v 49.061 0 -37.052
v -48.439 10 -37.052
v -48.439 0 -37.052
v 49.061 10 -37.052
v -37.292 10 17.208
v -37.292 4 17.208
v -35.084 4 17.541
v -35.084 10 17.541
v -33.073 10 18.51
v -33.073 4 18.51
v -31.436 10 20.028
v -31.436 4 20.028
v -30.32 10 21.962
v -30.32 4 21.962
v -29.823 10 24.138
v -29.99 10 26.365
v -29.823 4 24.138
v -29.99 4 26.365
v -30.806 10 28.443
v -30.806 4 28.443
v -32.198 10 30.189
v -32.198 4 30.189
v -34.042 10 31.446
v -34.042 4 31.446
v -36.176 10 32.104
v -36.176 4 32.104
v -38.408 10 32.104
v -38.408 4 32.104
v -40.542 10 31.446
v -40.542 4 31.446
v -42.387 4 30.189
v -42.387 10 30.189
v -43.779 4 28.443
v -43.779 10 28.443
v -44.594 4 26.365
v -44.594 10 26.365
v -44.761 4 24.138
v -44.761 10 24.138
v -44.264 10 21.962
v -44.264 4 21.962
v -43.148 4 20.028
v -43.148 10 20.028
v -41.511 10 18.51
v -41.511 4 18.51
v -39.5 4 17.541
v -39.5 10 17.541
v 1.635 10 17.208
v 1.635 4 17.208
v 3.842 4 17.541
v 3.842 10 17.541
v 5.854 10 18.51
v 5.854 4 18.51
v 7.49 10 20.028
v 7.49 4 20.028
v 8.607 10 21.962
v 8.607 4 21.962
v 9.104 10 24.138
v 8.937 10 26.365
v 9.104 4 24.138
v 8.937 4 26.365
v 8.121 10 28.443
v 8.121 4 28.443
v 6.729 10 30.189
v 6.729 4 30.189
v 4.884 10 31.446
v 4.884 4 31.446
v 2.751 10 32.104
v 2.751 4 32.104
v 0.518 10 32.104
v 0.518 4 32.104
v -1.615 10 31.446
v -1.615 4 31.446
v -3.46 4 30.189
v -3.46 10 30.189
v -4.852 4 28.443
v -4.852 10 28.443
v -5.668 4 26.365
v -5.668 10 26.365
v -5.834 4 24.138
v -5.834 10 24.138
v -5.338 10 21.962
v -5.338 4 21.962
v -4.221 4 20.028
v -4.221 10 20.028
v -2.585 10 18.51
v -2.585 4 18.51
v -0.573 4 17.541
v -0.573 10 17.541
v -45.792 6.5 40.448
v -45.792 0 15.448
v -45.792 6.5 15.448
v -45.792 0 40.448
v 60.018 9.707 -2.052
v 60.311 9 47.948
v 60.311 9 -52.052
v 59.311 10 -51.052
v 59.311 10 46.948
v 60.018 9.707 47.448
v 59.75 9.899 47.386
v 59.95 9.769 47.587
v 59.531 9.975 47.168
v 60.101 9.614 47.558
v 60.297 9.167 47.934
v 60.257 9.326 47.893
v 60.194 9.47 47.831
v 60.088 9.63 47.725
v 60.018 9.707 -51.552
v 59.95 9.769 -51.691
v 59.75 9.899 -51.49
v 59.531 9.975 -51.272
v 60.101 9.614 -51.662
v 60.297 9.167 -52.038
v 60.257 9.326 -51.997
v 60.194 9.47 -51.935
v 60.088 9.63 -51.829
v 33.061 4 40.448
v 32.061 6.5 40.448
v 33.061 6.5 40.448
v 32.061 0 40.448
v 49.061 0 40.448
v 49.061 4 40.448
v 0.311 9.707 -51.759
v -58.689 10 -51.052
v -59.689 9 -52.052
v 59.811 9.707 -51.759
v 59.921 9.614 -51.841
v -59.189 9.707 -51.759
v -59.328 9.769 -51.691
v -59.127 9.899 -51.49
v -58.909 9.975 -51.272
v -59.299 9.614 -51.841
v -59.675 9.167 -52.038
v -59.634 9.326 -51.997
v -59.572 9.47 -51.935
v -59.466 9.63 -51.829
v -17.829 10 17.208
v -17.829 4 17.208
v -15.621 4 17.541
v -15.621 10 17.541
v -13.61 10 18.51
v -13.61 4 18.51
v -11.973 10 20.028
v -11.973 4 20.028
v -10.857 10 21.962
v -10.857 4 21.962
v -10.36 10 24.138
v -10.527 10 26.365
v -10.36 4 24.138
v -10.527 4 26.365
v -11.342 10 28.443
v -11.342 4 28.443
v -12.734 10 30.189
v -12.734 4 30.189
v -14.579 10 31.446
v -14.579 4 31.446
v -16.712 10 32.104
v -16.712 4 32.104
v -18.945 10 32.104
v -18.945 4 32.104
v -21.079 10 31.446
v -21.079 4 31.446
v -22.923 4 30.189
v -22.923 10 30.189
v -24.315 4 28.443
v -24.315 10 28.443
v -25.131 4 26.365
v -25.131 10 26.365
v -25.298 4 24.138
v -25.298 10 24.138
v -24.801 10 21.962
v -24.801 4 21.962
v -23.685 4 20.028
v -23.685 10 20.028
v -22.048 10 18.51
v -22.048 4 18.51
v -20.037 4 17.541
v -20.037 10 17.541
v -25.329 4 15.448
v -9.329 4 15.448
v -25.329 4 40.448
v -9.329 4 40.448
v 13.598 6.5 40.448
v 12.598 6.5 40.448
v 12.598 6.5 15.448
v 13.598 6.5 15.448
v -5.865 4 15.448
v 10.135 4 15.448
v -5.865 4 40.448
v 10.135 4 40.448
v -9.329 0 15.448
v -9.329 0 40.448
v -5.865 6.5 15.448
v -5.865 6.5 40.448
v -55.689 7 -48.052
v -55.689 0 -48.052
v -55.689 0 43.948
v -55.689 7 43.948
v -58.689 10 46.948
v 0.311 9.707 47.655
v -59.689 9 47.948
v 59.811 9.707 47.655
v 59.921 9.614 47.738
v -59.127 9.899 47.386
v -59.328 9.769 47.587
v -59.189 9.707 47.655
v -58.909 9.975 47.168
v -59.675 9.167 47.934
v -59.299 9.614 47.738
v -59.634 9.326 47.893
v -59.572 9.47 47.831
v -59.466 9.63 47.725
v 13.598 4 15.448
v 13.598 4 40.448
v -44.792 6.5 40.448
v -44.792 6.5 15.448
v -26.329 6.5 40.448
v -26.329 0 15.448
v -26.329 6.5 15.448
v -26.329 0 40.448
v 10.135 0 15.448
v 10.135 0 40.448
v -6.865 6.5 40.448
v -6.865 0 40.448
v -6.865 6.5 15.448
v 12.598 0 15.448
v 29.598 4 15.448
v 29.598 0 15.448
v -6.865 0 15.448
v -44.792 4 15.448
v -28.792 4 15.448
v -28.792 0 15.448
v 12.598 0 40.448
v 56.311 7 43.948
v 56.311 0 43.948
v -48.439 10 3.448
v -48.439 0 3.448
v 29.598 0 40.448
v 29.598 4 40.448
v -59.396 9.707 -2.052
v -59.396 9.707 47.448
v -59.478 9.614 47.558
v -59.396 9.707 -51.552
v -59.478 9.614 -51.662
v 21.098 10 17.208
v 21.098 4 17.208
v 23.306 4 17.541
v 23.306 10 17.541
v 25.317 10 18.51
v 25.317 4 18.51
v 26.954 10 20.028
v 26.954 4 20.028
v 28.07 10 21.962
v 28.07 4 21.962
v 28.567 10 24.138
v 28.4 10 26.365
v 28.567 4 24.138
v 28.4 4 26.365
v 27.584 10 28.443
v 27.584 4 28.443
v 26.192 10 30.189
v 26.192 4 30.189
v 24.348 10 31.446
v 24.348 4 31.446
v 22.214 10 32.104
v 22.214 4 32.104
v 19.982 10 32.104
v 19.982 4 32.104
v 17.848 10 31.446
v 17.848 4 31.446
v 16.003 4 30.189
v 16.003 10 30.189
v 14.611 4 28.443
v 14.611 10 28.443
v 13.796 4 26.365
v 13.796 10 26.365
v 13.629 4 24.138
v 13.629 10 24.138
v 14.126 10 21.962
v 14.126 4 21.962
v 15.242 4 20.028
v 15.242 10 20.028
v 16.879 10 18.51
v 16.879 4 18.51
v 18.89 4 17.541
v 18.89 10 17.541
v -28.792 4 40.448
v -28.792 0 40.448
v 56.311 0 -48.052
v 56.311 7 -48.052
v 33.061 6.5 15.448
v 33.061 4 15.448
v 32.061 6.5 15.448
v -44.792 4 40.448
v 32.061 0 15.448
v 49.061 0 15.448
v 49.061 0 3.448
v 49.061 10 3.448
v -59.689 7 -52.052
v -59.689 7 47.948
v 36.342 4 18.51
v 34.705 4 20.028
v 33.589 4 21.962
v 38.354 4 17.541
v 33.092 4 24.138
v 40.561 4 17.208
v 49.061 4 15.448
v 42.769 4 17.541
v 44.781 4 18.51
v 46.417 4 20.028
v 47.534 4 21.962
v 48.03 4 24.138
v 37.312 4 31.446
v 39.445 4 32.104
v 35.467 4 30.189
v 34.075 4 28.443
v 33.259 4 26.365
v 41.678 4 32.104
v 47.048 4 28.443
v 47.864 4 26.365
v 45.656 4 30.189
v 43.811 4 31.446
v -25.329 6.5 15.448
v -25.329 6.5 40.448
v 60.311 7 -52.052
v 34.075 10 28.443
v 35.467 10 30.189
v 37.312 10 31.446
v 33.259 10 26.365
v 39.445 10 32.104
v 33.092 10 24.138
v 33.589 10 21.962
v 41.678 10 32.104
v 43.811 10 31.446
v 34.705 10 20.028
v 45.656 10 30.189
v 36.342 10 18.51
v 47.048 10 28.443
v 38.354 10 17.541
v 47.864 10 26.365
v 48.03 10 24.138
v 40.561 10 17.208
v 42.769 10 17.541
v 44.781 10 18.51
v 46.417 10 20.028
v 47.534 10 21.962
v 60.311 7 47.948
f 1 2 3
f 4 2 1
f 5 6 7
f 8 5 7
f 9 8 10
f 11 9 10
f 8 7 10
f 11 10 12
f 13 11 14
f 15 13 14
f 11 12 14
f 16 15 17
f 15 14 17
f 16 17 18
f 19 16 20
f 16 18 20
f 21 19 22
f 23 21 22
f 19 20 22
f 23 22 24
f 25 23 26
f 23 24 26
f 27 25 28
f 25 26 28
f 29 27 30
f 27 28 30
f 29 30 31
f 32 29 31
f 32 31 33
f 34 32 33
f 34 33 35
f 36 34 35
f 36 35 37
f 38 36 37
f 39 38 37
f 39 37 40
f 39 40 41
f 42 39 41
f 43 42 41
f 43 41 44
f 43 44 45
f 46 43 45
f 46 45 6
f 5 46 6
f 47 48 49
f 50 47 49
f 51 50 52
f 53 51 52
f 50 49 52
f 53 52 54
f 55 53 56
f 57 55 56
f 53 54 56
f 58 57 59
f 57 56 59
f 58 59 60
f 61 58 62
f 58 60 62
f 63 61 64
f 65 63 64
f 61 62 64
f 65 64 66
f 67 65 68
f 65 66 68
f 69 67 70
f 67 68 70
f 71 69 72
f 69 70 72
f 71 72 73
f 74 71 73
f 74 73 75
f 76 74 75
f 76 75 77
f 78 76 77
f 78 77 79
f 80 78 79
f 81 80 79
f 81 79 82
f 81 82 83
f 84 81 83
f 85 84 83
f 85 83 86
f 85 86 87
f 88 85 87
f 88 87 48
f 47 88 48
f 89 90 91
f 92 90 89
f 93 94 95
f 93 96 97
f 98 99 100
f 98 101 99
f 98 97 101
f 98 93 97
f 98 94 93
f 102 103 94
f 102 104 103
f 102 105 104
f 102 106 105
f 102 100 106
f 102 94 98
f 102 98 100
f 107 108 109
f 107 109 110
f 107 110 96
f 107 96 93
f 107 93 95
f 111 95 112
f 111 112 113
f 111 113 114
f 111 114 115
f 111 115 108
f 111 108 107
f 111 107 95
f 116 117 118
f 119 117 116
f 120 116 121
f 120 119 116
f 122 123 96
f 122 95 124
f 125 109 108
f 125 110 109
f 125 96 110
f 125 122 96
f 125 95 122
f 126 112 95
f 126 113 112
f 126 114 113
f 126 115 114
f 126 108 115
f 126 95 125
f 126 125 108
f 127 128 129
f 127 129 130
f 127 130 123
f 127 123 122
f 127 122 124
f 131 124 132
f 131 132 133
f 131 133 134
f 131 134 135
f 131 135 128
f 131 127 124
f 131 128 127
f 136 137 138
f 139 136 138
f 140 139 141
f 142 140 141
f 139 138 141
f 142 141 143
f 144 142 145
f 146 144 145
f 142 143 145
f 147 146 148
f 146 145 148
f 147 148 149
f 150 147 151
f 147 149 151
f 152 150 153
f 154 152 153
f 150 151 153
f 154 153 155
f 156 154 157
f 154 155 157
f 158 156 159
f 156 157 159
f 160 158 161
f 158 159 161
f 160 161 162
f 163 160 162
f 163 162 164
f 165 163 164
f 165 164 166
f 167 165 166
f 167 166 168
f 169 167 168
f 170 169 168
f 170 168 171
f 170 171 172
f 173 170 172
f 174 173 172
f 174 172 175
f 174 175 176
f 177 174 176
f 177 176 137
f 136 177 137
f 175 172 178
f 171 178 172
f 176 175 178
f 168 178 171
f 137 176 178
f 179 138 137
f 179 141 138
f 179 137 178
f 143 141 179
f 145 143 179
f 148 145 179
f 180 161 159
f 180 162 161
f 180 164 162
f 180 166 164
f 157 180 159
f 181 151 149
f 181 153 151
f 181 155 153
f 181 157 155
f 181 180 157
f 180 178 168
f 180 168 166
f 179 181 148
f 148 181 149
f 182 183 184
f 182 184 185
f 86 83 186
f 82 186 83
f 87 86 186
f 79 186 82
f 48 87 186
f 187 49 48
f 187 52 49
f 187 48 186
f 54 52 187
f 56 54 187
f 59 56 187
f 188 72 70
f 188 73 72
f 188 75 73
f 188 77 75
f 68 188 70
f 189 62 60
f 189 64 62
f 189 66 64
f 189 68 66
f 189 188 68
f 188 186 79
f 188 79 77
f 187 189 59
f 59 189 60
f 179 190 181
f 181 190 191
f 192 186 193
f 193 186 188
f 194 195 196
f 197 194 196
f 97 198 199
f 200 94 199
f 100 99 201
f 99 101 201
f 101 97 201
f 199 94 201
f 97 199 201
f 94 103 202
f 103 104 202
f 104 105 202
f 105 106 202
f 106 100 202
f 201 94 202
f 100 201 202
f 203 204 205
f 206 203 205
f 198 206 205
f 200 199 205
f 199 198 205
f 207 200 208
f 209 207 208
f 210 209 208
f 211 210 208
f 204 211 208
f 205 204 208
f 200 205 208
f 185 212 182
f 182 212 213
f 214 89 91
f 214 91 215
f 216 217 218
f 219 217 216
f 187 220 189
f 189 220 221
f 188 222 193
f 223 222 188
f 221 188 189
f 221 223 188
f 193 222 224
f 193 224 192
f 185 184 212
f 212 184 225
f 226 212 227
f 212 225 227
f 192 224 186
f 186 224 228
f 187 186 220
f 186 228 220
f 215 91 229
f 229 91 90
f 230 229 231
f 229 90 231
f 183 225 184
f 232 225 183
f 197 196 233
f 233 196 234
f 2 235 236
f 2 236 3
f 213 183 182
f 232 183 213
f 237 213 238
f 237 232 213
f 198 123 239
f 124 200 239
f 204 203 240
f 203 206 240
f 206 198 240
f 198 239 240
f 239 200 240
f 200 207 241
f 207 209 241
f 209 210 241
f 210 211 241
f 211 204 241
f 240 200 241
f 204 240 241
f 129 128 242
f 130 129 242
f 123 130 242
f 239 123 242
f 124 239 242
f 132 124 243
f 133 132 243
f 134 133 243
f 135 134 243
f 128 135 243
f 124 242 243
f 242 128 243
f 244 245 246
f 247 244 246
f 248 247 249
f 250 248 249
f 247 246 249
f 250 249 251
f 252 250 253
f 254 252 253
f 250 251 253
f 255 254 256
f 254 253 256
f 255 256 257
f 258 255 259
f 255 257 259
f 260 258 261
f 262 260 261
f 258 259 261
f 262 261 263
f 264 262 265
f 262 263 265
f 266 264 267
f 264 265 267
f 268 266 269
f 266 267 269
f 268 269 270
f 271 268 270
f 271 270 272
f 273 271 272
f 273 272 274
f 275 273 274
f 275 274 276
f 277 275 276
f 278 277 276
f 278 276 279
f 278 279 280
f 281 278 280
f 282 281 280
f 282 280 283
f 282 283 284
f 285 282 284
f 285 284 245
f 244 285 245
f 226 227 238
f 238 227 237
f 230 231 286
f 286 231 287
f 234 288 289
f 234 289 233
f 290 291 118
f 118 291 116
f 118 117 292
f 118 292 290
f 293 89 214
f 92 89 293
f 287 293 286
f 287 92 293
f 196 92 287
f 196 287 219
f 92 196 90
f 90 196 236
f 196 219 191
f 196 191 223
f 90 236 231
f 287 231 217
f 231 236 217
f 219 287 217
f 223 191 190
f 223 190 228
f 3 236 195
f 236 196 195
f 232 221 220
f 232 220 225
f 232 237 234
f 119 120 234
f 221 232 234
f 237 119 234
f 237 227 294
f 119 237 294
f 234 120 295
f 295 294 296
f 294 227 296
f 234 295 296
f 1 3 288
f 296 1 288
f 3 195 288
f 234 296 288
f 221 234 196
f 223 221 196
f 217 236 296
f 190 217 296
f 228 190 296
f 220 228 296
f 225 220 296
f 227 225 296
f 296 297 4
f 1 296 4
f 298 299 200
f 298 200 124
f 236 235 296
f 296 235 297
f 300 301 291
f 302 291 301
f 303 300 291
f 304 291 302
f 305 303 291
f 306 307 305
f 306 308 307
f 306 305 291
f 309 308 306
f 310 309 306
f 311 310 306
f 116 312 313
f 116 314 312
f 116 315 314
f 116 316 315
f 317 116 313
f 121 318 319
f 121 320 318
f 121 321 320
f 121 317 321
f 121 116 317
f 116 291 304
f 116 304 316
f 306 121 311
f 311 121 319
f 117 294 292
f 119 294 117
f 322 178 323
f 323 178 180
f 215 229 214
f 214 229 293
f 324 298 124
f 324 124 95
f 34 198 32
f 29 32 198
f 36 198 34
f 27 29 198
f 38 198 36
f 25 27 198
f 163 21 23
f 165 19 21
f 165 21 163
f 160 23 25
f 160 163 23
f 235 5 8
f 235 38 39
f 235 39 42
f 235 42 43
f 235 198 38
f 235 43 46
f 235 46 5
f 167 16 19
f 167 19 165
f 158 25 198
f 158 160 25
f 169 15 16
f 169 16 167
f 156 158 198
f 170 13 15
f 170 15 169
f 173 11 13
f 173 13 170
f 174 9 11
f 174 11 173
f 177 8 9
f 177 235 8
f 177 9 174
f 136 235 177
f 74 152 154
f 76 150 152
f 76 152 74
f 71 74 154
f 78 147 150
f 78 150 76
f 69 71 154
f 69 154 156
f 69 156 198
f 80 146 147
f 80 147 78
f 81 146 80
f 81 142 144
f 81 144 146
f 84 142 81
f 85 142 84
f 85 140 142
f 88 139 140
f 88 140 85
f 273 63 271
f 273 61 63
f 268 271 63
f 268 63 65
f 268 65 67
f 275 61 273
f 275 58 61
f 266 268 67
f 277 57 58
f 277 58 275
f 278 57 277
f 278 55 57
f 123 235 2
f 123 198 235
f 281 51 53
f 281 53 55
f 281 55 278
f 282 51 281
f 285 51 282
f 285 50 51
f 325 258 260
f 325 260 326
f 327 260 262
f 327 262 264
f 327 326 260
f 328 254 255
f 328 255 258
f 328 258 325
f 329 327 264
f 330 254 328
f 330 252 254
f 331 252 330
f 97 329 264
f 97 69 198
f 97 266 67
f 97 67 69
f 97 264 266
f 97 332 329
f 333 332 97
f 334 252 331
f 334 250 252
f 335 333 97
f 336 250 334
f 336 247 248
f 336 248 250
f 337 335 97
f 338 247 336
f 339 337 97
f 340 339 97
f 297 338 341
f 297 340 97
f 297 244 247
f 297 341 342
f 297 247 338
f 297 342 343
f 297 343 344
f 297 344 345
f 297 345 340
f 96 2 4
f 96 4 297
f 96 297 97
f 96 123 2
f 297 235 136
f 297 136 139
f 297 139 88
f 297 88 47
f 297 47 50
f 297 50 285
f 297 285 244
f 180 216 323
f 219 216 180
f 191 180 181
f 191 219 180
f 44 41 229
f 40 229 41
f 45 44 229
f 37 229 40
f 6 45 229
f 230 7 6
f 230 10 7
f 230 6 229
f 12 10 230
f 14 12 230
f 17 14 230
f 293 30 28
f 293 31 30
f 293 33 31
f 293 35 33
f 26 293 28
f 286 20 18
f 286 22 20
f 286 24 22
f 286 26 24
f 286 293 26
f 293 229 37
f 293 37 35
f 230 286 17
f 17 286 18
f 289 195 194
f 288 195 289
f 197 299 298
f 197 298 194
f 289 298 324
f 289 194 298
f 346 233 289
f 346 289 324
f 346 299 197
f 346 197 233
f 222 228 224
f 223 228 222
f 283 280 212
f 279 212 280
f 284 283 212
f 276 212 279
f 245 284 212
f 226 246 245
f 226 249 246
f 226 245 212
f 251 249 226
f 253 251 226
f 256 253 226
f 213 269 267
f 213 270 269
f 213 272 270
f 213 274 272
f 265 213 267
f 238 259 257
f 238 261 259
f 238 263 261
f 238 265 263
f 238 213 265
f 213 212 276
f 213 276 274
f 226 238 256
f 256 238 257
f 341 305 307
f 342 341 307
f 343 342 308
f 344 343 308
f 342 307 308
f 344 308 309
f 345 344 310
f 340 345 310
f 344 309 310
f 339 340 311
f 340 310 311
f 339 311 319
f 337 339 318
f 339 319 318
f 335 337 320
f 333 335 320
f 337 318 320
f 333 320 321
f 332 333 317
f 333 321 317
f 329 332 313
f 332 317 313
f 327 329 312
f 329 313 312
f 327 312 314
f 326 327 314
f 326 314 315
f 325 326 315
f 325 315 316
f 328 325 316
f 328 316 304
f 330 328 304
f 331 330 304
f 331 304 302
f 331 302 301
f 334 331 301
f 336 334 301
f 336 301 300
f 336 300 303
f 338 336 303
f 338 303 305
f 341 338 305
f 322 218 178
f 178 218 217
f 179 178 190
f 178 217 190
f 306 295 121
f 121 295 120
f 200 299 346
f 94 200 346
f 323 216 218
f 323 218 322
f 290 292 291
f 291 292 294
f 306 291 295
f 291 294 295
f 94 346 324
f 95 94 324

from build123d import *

# Parameters (mm, degrees)
SKETCH1_W           = 120
SKETCH1_H           = 100
BOSS_EXTRUDE1_DEPTH = 10
SKETCH2_W           = 97.5
SKETCH2_H           = 40.5
CUT_EXTRUDE1_DEPTH  = 10
SKETCH3_W           = 120
SKETCH3_H           = 100
SKETCH3_W_2         = 112
SKETCH3_H_2         = 92
CUT_EXTRUDE3_DEPTH  = 7
SKETCH4_W           = 17
SKETCH4_H           = 25
CUT_EXTRUDE4_DEPTH  = 4
SKETCH5_W           = 1
SKETCH5_H           = 25
CUT_EXTRUDE6_DEPTH  = 2.5
SKETCH6_R           = 7.49
CUT_EXTRUDE12_DEPTH = 80.892767694
VARFILLET1_R        = 1


with BuildPart() as part:
    # Sketch1 → Boss-Extrude1 (new body)
    with BuildSketch(Plane(origin=(0, 0, 0), x_dir=(1, 0, 0), z_dir=(0, 1, 0))):
        with Locations((0.311320755, 2.051886792)):
            Rectangle(SKETCH1_W, SKETCH1_H)
    extrude(amount=BOSS_EXTRUDE1_DEPTH)

    # Sketch2 → Cut-Extrude1 (cut)
    with BuildSketch(Plane(origin=(0, 10, 0), x_dir=(1, 0, 0), z_dir=(0, 1, 0))):
        with Locations((0.311320755, 16.801886792)):
            Rectangle(SKETCH2_W, SKETCH2_H)
    extrude(amount=-CUT_EXTRUDE1_DEPTH, mode=Mode.SUBTRACT)

    # Sketch3 → Cut-Extrude3 (cut)
    with BuildSketch(Plane.XZ):
        with Locations((0.311320755, -2.051886792)):
            Rectangle(SKETCH3_W, SKETCH3_H)
        with Locations((0.311320755, -2.051886792)):
            Rectangle(SKETCH3_W_2, SKETCH3_H_2, mode=Mode.SUBTRACT)
    extrude(amount=-CUT_EXTRUDE3_DEPTH, mode=Mode.SUBTRACT)

    # Sketch4 → Cut-Extrude4 (cut)
    with BuildSketch(Plane.XZ):
        with Locations((-37.292172289, 27.948113208)):
            Rectangle(SKETCH4_W, SKETCH4_H)
        with Locations((-17.828799028, 27.948113208)):
            Rectangle(SKETCH4_W, SKETCH4_H)
        with Locations((1.634574233, 27.948113208)):
            Rectangle(SKETCH4_W, SKETCH4_H)
        with Locations((21.097947494, 27.948113208)):
            Rectangle(SKETCH4_W, SKETCH4_H)
        with Locations((40.561320755, 27.948113208)):
            Rectangle(SKETCH4_W, SKETCH4_H)
    extrude(amount=-CUT_EXTRUDE4_DEPTH, mode=Mode.SUBTRACT)

    # Sketch5 → Cut-Extrude6 (cut)
    with BuildSketch(Plane.XZ.offset(-4)):
        with Locations((32.561320755, 27.948113208)):
            Rectangle(SKETCH5_W, SKETCH5_H)
        with Locations((13.097947494, 27.948113208)):
            Rectangle(SKETCH5_W, SKETCH5_H)
        with Locations((-6.365425767, 27.948113208)):
            Rectangle(SKETCH5_W, SKETCH5_H)
        with Locations((-25.828799028, 27.948113208)):
            Rectangle(SKETCH5_W, SKETCH5_H)
        with Locations((-45.292172289, 27.948113208)):
            Rectangle(SKETCH5_W, SKETCH5_H)
    extrude(amount=-CUT_EXTRUDE6_DEPTH, mode=Mode.SUBTRACT)

    # Sketch6 → Cut-Extrude12 (cut, through all)
    with BuildSketch(Plane.XZ.offset(-4)):
        with Locations((40.561320755, 24.698113208)):
            Circle(SKETCH6_R)
        with Locations((21.097947494, 24.698113208)):
            Circle(SKETCH6_R)
        with Locations((1.634574233, 24.698113208)):
            Circle(SKETCH6_R)
        with Locations((-17.828799028, 24.698113208)):
            Circle(SKETCH6_R)
        with Locations((-37.292172289, 24.698113208)):
            Circle(SKETCH6_R)
    extrude(amount=-CUT_EXTRUDE12_DEPTH, mode=Mode.SUBTRACT)

    # VarFillet1
    varfillet1_edges = [part.edges().sort_by_distance(p)[0] for p in [
        (0.311320755, 10, 47.948113208),
        (60.311320755, 10, -2.051886792),
        (0.311320755, 10, -52.051886792),
        (-59.688679245, 10, -2.051886792),
    ]]
    fillet(varfillet1_edges, radius=VARFILLET1_R)


solid = part.part
